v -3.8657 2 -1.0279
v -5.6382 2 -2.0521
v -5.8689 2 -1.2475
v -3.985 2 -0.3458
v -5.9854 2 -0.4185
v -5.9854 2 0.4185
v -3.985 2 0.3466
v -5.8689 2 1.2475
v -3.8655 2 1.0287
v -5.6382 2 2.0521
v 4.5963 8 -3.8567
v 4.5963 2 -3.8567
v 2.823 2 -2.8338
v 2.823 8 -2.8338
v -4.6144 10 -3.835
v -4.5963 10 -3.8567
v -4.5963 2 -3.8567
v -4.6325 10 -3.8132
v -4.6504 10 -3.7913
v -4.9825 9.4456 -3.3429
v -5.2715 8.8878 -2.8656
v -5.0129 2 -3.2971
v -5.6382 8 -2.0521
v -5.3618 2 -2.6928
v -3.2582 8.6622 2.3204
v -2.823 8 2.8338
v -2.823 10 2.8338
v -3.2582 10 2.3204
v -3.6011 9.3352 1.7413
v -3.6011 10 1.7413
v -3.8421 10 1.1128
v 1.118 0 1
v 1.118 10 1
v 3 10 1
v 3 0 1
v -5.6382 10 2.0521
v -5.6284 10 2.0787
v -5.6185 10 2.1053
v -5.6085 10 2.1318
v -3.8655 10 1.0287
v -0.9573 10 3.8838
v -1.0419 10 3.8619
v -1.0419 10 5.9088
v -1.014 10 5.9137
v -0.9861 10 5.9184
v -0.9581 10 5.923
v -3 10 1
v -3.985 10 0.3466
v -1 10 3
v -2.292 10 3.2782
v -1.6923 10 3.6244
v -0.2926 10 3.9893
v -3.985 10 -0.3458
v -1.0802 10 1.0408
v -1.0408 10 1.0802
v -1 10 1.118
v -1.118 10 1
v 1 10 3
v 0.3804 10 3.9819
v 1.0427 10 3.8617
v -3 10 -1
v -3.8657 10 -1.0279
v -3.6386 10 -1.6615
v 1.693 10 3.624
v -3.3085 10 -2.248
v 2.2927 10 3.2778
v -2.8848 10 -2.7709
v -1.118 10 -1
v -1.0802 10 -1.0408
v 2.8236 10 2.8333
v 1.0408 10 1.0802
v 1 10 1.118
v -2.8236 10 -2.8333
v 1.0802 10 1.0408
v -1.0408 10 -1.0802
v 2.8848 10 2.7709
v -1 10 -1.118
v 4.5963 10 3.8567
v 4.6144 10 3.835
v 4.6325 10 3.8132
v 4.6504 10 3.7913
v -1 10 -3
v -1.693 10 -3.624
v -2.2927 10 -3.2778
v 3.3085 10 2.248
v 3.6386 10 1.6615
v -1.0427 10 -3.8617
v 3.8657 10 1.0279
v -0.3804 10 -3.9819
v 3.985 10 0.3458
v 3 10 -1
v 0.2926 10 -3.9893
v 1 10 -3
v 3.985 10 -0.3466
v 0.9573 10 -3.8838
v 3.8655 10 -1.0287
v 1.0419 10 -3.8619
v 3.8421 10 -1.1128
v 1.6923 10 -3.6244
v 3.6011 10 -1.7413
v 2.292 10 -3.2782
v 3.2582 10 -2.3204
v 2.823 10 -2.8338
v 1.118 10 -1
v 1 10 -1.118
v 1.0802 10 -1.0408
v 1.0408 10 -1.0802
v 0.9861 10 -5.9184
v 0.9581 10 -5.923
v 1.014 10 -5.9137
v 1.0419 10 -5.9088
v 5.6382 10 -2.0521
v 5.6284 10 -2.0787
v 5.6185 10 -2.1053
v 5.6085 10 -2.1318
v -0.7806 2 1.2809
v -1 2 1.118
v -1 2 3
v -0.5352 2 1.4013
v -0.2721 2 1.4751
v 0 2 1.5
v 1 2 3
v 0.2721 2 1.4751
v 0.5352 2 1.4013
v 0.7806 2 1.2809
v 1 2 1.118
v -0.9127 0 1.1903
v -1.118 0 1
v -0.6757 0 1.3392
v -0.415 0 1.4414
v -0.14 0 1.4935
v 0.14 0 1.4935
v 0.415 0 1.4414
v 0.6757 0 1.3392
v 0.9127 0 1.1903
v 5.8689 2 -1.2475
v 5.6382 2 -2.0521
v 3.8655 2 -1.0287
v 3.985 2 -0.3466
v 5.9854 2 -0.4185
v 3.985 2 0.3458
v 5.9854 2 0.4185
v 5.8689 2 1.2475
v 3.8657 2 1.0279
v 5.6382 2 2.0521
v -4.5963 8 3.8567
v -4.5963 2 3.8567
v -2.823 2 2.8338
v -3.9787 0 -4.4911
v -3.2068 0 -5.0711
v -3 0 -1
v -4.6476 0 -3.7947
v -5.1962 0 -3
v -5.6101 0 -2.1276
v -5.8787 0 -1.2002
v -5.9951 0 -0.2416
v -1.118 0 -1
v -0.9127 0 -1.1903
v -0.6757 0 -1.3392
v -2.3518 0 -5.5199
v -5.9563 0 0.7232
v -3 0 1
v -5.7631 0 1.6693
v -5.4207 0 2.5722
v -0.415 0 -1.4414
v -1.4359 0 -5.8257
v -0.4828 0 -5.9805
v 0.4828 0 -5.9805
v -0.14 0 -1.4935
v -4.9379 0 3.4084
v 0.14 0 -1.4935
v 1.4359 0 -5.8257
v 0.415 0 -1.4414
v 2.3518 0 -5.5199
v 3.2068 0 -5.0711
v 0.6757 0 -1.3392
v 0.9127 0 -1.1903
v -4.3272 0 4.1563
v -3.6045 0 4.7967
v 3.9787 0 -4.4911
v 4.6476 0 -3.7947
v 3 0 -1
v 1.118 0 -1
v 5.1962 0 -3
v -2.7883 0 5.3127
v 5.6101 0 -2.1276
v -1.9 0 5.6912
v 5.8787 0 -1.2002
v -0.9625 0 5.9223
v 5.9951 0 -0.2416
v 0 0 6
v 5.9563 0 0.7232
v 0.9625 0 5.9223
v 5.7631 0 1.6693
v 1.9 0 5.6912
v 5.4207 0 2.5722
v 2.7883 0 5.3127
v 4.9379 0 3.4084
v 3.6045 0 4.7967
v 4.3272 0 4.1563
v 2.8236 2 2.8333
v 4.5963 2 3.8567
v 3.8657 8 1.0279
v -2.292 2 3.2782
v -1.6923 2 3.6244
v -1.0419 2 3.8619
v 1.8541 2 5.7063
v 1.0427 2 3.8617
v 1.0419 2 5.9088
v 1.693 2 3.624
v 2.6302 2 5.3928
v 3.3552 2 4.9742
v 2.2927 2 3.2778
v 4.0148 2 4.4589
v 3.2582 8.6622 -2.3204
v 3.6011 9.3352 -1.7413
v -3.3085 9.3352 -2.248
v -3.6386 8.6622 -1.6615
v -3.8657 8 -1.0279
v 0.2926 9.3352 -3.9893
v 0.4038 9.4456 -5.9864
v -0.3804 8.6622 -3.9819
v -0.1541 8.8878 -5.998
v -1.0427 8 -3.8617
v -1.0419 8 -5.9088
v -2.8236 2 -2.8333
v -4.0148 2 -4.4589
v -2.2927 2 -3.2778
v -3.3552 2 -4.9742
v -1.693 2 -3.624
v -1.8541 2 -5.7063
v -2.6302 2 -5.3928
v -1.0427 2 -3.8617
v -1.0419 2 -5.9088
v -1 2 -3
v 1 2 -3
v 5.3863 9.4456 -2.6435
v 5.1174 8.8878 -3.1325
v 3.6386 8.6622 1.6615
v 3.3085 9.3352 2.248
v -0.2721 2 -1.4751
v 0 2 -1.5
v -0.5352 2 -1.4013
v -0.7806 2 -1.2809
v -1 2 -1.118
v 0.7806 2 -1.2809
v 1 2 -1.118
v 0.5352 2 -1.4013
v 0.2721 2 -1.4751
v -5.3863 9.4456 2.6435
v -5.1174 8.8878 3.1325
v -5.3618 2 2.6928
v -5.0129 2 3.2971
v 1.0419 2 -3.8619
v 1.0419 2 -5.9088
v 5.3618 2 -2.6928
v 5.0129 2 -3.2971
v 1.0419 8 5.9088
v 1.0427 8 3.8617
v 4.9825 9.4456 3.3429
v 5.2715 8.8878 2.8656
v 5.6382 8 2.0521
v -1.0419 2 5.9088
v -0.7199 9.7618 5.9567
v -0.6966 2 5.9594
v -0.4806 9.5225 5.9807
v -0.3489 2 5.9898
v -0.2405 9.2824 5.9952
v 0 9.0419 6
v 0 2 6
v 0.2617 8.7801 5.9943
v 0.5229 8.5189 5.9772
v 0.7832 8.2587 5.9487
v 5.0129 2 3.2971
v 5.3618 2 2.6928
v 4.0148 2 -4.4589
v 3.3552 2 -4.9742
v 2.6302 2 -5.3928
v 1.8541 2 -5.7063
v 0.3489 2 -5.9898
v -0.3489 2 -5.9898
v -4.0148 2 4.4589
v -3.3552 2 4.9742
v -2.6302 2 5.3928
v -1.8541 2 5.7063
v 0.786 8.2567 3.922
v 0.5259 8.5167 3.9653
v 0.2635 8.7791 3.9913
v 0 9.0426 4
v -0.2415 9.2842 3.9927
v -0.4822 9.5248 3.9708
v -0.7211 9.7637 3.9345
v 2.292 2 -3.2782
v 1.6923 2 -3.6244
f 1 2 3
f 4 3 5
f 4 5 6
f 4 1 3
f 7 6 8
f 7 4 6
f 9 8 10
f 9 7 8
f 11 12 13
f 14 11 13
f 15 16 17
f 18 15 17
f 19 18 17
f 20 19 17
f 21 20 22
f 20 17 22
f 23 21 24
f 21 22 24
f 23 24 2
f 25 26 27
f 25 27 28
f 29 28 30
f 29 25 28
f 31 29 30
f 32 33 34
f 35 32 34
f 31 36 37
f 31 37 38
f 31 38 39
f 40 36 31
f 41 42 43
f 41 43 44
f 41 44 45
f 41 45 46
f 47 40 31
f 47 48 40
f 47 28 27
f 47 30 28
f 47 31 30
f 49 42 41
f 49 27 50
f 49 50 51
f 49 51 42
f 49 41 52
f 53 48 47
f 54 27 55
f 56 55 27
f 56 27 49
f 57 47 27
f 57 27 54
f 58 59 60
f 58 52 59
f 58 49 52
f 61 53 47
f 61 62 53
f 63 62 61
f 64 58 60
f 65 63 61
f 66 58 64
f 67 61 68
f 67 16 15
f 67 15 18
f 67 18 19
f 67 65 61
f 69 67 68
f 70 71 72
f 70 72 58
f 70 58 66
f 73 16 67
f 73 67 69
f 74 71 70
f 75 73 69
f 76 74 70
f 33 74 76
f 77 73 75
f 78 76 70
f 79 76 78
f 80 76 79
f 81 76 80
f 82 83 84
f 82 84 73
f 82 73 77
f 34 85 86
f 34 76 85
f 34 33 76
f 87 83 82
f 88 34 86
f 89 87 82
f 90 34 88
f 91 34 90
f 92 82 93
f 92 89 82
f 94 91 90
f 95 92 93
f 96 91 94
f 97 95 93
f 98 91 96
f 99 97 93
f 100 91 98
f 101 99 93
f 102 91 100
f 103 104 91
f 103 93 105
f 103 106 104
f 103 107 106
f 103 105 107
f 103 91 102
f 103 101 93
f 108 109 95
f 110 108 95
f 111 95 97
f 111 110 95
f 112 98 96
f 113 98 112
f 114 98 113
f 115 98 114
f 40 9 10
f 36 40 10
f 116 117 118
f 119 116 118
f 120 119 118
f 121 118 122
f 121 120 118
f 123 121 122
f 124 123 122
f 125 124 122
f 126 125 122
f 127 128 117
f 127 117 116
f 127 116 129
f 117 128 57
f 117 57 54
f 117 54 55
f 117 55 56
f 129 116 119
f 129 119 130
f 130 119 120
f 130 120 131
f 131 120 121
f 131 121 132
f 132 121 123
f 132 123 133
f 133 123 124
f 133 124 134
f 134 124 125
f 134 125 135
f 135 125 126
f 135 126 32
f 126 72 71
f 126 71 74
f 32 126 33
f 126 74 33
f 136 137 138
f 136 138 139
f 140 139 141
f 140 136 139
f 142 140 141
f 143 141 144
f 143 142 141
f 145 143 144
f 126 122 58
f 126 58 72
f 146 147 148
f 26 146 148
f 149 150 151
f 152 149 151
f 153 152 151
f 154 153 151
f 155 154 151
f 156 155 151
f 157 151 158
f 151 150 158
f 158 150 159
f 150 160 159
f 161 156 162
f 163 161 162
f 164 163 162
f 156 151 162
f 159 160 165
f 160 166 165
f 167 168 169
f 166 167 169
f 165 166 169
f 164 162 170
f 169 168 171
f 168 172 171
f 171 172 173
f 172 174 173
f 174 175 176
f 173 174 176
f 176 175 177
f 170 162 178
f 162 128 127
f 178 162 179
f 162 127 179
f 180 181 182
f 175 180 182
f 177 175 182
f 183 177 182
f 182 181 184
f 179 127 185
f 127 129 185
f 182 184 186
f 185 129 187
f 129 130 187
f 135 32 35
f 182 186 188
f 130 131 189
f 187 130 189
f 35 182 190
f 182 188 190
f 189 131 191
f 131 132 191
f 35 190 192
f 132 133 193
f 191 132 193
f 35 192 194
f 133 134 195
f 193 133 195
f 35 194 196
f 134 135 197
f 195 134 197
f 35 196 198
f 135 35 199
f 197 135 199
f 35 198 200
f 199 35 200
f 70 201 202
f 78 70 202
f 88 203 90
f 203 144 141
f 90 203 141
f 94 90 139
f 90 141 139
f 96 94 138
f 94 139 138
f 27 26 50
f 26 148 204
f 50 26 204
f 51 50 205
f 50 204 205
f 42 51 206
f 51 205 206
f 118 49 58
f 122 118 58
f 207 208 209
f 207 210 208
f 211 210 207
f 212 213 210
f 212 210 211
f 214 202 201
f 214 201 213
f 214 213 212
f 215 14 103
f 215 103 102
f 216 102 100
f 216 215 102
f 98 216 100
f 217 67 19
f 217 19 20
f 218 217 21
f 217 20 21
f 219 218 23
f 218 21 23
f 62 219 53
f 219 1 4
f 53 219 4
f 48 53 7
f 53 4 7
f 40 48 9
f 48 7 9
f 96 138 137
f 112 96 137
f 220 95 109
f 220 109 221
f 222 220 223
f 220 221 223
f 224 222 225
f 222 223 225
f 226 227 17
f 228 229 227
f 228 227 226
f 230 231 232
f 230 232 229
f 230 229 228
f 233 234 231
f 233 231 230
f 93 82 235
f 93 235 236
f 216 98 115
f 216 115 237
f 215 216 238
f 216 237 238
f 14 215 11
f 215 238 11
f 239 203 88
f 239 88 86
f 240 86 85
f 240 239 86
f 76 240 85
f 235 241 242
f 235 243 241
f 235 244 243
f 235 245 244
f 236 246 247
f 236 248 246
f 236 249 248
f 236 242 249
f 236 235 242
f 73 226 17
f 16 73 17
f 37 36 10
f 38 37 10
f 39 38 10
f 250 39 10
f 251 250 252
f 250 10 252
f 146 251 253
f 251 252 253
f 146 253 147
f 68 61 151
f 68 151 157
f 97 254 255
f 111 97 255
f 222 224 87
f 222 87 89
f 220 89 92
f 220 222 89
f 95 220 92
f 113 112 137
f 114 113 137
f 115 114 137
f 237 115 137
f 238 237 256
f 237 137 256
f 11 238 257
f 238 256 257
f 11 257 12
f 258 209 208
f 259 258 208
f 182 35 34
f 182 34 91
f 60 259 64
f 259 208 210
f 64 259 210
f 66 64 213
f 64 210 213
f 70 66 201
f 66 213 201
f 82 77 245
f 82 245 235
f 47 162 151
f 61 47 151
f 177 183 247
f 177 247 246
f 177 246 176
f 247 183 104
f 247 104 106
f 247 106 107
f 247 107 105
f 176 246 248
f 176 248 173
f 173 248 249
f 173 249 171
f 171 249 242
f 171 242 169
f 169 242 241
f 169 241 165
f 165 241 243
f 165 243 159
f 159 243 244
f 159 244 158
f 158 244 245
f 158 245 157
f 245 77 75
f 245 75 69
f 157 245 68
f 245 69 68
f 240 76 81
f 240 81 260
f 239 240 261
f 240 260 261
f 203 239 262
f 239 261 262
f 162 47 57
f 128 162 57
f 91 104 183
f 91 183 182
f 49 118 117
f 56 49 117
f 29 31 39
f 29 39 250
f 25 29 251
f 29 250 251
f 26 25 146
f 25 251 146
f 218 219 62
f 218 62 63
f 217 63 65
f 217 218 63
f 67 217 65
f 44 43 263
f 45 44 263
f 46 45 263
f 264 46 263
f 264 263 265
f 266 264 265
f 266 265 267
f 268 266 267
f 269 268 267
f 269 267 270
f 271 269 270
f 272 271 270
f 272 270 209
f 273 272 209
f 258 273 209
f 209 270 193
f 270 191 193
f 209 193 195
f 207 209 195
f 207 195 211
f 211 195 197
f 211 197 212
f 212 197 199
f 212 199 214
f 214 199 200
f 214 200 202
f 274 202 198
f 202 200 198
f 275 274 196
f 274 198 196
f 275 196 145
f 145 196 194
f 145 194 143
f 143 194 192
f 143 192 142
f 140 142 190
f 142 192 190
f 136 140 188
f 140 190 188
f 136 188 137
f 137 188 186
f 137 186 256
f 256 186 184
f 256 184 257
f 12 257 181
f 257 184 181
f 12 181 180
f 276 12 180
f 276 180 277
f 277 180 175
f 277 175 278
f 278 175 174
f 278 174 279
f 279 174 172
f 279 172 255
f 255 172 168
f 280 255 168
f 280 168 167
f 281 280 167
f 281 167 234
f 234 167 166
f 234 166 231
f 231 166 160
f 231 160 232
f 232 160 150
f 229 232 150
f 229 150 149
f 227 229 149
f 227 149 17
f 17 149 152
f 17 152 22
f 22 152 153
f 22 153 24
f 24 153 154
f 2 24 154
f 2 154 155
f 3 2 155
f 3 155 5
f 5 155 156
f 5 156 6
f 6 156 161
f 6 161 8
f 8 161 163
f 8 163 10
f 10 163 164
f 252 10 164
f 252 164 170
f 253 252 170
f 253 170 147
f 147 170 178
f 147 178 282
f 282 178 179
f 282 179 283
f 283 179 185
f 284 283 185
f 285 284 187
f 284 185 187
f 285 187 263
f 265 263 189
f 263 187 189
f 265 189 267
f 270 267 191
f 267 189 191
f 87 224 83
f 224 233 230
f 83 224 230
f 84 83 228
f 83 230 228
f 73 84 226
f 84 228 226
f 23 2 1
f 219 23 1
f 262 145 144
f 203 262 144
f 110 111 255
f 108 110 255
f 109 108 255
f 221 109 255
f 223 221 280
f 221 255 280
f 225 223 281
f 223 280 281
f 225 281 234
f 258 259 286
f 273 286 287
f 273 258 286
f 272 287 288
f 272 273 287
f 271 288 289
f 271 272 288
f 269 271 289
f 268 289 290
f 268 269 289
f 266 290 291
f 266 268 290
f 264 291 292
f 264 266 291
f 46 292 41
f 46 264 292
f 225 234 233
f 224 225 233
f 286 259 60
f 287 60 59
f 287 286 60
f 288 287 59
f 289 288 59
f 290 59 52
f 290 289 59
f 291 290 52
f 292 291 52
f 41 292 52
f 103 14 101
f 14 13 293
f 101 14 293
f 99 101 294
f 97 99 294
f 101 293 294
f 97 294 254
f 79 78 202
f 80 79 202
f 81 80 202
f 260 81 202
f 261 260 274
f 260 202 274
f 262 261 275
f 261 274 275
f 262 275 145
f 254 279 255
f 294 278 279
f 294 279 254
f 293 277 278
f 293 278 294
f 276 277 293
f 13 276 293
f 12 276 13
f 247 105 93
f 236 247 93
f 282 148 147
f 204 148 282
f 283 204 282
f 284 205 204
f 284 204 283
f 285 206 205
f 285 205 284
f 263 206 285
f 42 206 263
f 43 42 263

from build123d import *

# Parameters (mm, degrees)
SKETCH1_R           = 6
BOSS_EXTRUDE1_DEPTH = 2
SKETCH2_R           = 4
BOSS_EXTRUDE2_DEPTH = 8
SKETCH3_W           = 6
SKETCH3_H           = 2
CUT_EXTRUDE1_DEPTH  = 14.114877049
SKETCH4_W           = 2
SKETCH4_H           = 6
CUT_EXTRUDE2_DEPTH  = 8
SKETCH10_R          = 1.5
CUT_EXTRUDE3_DEPTH  = 14.114877049
BOSS_EXTRUDE3_START = -8
BOSS_EXTRUDE3_DEPTH = 8
CHAMFER3_SIZE       = 2


with BuildPart() as part:
    # Sketch1 → Boss-Extrude1 (new body)
    with BuildSketch(Plane(origin=(0, 0, 0), x_dir=(1, 0, 0), z_dir=(0, 1, 0))):
        with Locations(Location((0, 0, 0), (0, 0, 270))):
            Circle(SKETCH1_R)
    extrude(amount=BOSS_EXTRUDE1_DEPTH)

    # Sketch2 → Boss-Extrude2 (add)
    with BuildSketch(Plane(origin=(0, 2, 0), x_dir=(1, 0, 0), z_dir=(0, 1, 0))):
        with Locations(Location((0, 0, 0), (0, 0, 270))):
            Circle(SKETCH2_R)
    extrude(amount=BOSS_EXTRUDE2_DEPTH)

    # Sketch3 → Cut-Extrude1 (cut, through all)
    with BuildSketch(Plane(origin=(0, 10, 0), x_dir=(1, 0, 0), z_dir=(0, 1, 0))):
        Rectangle(SKETCH3_W, SKETCH3_H)
    extrude(amount=-CUT_EXTRUDE1_DEPTH, mode=Mode.SUBTRACT)

    # Sketch4 → Cut-Extrude2 (cut)
    with BuildSketch(Plane(origin=(0, 10, 0), x_dir=(1, 0, 0), z_dir=(0, 1, 0))):
        Rectangle(SKETCH4_W, SKETCH4_H)
    extrude(amount=-CUT_EXTRUDE2_DEPTH, mode=Mode.SUBTRACT)

    # Sketch10 → Cut-Extrude3 (cut, through all)
    with BuildSketch(Plane(origin=(0, 10, 0), x_dir=(1, 0, 0), z_dir=(0, 1, 0))):
        Circle(SKETCH10_R)
    extrude(amount=-CUT_EXTRUDE3_DEPTH, mode=Mode.SUBTRACT)

    # Sketch11 → Boss-Extrude3 (add)
    with BuildSketch(Plane(origin=(0, 10, 0), x_dir=(1, 0, 0), z_dir=(0, 1, 0)).offset(BOSS_EXTRUDE3_START)):
        with BuildLine():
            Line((-1.041889066, 5.908846518), (-1.042680136, 3.861711814))
            Line((-1.042680136, 3.861711814), (1.041889066, 3.86192532))
            Line((1.041889066, 3.86192532), (1.041889066, 5.908846518))
            ThreePointArc((1.041889066, 5.908846518), (0, 6), (-1.041889066, 5.908846518))
        make_face()
        with BuildLine():
            Line((4.596266659, 3.856725658), (2.823000465, 2.833843393))
            Line((2.823000465, 2.833843393), (3.865469967, 1.028660261))
            Line((3.865469967, 1.028660261), (5.638155725, 2.05212086))
            ThreePointArc((5.638155725, 2.05212086), (5.196152423, 3), (4.596266659, 3.856725658))
        make_face()
        with BuildLine():
            Line((5.638155725, -2.05212086), (3.865680601, -1.027868421))
            Line((3.865680601, -1.027868421), (2.823580901, -2.833265059))
            Line((2.823580901, -2.833265059), (4.596266659, -3.856725658))
            ThreePointArc((4.596266659, -3.856725658), (5.196152423, -3), (5.638155725, -2.05212086))
        make_face()
        with BuildLine():
            Line((1.041889066, -5.908846518), (1.042680136, -3.861711814))
            Line((1.042680136, -3.861711814), (-1.041889066, -3.86192532))
            Line((-1.041889066, -3.86192532), (-1.041889066, -5.908846518))
            ThreePointArc((-1.041889066, -5.908846518), (0, -6), (1.041889066, -5.908846518))
        make_face()
        with BuildLine():
            Line((-4.596266659, -3.856725658), (-2.823000465, -2.833843393))
            Line((-2.823000465, -2.833843393), (-3.865469967, -1.028660261))
            Line((-3.865469967, -1.028660261), (-5.638155725, -2.05212086))
            ThreePointArc((-5.638155725, -2.05212086), (-5.196152423, -3), (-4.596266659, -3.856725658))
        make_face()
        with BuildLine():
            Line((-5.638155725, 2.05212086), (-3.865680601, 1.027868421))
            Line((-3.865680601, 1.027868421), (-2.823580901, 2.833265059))
            Line((-2.823580901, 2.833265059), (-4.596266659, 3.856725658))
            ThreePointArc((-4.596266659, 3.856725658), (-5.196152423, 3), (-5.638155725, 2.05212086))
        make_face()
    extrude(amount=BOSS_EXTRUDE3_DEPTH)

    # Chamfer3
    # the kernel refuses this chamfer: 2 mm, written as the material it takes off along each edge
    with BuildSketch(Plane(origin=(9.051545693, 10, -6.426687193), x_dir=(0.49947639120581244, 0.02749587661058648, 0.865891050535478), z_dir=(-0.8662185531215343, 0, 0.49966530620810146))) as chamfer3_piece_1_section:
        Polygon((CHAMFER3_SIZE * 0.999621916911, -CHAMFER3_SIZE * 0.0274958766106), (-CHAMFER3_SIZE * 0.0274958766106, -CHAMFER3_SIZE * 0.999621916911), (0, 0), align=None)
    chamfer3_piece_1 = extrude(amount=12.333866809, mode=Mode.PRIVATE)
    chamfer3_piece_1 = chamfer3_piece_1 - Plane(origin=(0, 9.335728608, 0), x_dir=(0, 0, 1), z_dir=(0, -1, 0)) * Cylinder(4, 33, mode=Mode.PRIVATE)
    add(chamfer3_piece_1, mode=Mode.SUBTRACT)
    with BuildSketch(Plane(origin=(10.091447218, 10, 4.625524917), x_dir=(-0.5001454510704151, 0.027495876610586487, 0.8655047686425457), z_dir=(-0.8658321251267121, 0, -0.5003346191286003))) as chamfer3_piece_2_section:
        Polygon((CHAMFER3_SIZE * 0.999621916911, -CHAMFER3_SIZE * 0.0274958766106), (-CHAMFER3_SIZE * 0.0274958766106, -CHAMFER3_SIZE * 0.999621916911), (0, 0), align=None)
    chamfer3_piece_2 = extrude(amount=12.333866809, mode=Mode.PRIVATE)
    chamfer3_piece_2 = chamfer3_piece_2 - Plane(origin=(0, 9.332082239, 0), x_dir=(0, 0, 1), z_dir=(0, -1, 0)) * Cylinder(4, 33, mode=Mode.PRIVATE)
    add(chamfer3_piece_2, mode=Mode.SUBTRACT)
    with BuildSketch(Plane(origin=(1.039901525, 10, 11.05221211), x_dir=(0.027495874557653455, -0.9996219169112968, 1.0625176464596534e-05), z_dir=(0.0003864279948254377, 0, -0.9999999253366997))) as chamfer3_piece_3_section:
        Polygon((CHAMFER3_SIZE * 0.999621916911, CHAMFER3_SIZE * 0.0274958766106), (-CHAMFER3_SIZE * 0.0274958766106, CHAMFER3_SIZE * 0.999621916911), (0, 0), align=None)
    chamfer3_piece_3 = extrude(amount=12.333866809, mode=Mode.PRIVATE)
    chamfer3_piece_3 = chamfer3_piece_3 - Plane(origin=(0, 9.010529582, 0), x_dir=(0, 0, 1), z_dir=(0, -1, 0)) * Cylinder(4, 33, mode=Mode.PRIVATE)
    add(chamfer3_piece_3, mode=Mode.SUBTRACT)
    with BuildSketch(Plane(origin=(-9.051545693, 10, 6.426687193), x_dir=(-0.4994763912058064, 0.02749587661058648, -0.8658910505354813), z_dir=(0.8662185531215377, 0, -0.4996653062080955))) as chamfer3_piece_4_section:
        Polygon((CHAMFER3_SIZE * 0.999621916911, -CHAMFER3_SIZE * 0.0274958766106), (-CHAMFER3_SIZE * 0.0274958766106, -CHAMFER3_SIZE * 0.999621916911), (0, 0), align=None)
    chamfer3_piece_4 = extrude(amount=12.333866809, mode=Mode.PRIVATE)
    chamfer3_piece_4 = chamfer3_piece_4 - Plane(origin=(0, 9.335728608, 0), x_dir=(0, 0, 1), z_dir=(0, -1, 0)) * Cylinder(4, 33, mode=Mode.PRIVATE)
    add(chamfer3_piece_4, mode=Mode.SUBTRACT)
    with BuildSketch(Plane(origin=(-10.091447218, 10, -4.625524917), x_dir=(0.5001454510704163, 0.02749587661058648, -0.8655047686425448), z_dir=(0.8658321251267114, 0, 0.5003346191286018))) as chamfer3_piece_5_section:
        Polygon((CHAMFER3_SIZE * 0.999621916911, -CHAMFER3_SIZE * 0.0274958766106), (-CHAMFER3_SIZE * 0.0274958766106, -CHAMFER3_SIZE * 0.999621916911), (0, 0), align=None)
    chamfer3_piece_5 = extrude(amount=12.333866809, mode=Mode.PRIVATE)
    chamfer3_piece_5 = chamfer3_piece_5 - Plane(origin=(0, 9.332082239, 0), x_dir=(0, 0, 1), z_dir=(0, -1, 0)) * Cylinder(4, 33, mode=Mode.PRIVATE)
    add(chamfer3_piece_5, mode=Mode.SUBTRACT)
    with BuildSketch(Plane(origin=(-1.039901525, 10, -11.05221211), x_dir=(0.9996218422762253, 0.027495876610586487, 0.00038628189292865347), z_dir=(-0.00038642799481849587, 0, 0.9999999253366997))) as chamfer3_piece_6_section:
        Polygon((CHAMFER3_SIZE * 0.999621916911, -CHAMFER3_SIZE * 0.0274958766106), (-CHAMFER3_SIZE * 0.0274958766106, -CHAMFER3_SIZE * 0.999621916911), (0, 0), align=None)
    chamfer3_piece_6 = extrude(amount=12.333866809, mode=Mode.PRIVATE)
    chamfer3_piece_6 = chamfer3_piece_6 - Plane(origin=(0, 9.346435038, 0), x_dir=(0, 0, 1), z_dir=(0, -1, 0)) * Cylinder(4, 33, mode=Mode.PRIVATE)
    add(chamfer3_piece_6, mode=Mode.SUBTRACT)


solid = part.part
